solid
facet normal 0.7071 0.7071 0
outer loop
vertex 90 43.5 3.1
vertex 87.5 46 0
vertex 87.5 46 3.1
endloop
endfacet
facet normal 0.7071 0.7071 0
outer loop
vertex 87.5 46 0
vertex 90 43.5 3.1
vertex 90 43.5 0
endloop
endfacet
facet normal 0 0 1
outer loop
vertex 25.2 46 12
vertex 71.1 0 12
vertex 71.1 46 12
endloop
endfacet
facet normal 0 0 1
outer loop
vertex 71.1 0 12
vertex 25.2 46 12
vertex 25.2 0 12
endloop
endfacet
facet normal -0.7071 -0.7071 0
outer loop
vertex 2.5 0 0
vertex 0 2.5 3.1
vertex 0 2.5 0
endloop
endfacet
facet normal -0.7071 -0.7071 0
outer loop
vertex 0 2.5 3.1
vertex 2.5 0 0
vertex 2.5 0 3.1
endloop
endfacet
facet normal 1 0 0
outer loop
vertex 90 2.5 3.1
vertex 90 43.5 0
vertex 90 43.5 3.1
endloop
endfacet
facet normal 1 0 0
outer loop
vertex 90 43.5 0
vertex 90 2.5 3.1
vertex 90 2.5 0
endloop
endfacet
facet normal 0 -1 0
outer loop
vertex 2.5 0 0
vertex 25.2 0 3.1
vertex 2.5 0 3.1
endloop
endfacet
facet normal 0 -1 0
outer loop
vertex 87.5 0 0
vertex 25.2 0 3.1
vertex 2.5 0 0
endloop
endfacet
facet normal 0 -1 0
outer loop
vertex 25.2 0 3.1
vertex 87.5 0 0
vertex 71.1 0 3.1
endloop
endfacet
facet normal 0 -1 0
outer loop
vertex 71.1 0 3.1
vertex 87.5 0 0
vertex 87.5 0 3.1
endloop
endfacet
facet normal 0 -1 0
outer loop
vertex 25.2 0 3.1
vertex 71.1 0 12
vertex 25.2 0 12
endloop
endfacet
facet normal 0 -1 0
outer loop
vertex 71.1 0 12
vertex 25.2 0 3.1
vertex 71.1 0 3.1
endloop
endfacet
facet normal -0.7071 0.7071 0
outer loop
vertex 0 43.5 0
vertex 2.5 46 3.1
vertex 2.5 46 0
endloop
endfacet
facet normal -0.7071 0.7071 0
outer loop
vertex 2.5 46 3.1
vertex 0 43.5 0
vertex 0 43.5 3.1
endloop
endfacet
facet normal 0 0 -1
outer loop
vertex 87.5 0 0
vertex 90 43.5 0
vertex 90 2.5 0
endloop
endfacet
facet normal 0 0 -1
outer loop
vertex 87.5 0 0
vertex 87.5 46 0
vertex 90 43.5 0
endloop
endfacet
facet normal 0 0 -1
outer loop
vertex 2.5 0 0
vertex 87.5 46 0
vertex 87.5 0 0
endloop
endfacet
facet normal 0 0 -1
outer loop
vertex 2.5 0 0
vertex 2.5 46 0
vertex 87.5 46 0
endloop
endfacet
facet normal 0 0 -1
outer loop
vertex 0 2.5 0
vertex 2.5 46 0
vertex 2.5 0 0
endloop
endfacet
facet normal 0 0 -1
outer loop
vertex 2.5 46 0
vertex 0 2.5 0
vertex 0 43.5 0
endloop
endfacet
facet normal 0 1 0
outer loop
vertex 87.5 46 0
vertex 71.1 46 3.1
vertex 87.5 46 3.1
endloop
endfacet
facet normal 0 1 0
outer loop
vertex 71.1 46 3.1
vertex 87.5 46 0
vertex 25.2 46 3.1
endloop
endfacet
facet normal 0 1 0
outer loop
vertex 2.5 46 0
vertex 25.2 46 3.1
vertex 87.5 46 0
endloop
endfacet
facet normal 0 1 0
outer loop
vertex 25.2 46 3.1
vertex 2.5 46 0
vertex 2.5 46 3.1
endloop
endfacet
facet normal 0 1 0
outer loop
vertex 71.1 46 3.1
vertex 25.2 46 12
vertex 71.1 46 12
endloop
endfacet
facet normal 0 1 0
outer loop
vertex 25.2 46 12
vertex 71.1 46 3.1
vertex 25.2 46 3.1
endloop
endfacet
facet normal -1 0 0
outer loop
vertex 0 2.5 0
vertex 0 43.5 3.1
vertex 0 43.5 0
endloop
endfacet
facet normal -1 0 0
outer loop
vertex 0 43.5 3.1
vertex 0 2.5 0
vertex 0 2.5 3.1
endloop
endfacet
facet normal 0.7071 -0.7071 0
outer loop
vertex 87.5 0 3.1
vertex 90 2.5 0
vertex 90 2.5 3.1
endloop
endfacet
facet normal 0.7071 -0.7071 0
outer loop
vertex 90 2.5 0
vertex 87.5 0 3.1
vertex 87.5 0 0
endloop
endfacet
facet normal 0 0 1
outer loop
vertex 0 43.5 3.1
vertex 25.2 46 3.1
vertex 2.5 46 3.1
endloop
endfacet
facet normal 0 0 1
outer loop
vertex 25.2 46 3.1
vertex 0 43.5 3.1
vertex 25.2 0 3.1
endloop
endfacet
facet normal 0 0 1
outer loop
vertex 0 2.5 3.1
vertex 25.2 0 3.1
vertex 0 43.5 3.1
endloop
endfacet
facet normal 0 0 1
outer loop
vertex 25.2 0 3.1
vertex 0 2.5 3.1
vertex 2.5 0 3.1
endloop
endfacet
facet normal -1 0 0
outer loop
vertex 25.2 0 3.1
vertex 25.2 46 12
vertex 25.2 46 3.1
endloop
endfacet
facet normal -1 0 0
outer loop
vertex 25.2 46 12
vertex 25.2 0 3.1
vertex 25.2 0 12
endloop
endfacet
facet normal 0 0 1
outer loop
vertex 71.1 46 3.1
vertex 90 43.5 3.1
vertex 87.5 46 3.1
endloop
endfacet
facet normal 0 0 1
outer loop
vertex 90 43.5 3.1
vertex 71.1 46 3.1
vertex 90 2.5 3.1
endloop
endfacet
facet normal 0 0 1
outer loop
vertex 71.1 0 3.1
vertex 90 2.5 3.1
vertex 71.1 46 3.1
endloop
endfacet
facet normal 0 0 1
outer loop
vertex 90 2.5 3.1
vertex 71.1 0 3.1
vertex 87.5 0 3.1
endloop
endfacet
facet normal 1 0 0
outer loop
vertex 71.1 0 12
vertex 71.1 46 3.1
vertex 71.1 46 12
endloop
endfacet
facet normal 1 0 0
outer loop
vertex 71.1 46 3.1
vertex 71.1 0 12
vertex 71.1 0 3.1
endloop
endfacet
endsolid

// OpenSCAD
$fn = 32;

// ----------------------------------------------------------------------
// Stepped bar: centerstep, 90 x 46 x 12/3.1 mm
// ----------------------------------------------------------------------

// --- parameters (mm) ---
bar_l = 90;               // bar length, X
bar_w = 46;               // bar width, Y
plate_t = 12;             // thickness of the thick zone, Z
thin_t = 3.1;             // thickness of the thin zone
corner_c = 2.5;           // corner chamfer of the bar
step_cut = 8.9;           // material removed from the thin zone
thick_from = 25.2;        // start of the thick middle zone
thick_to = 71.1;          // end of the thick middle zone
depth_1 = 8.9;            // depth of cut 1 from the top face
depth_2 = 8.9;            // depth of cut 2 from the top face

profile = [[2.5, 0], [87.5, 0], [90, 2.5], [90, 43.5], [87.5, 46], [2.5, 46], [0, 43.5], [0, 2.5]];  // primary outline, 8 points, counter clockwise
void_1 = [[-1, -1], [25.2, -1], [25.2, 47], [-1, 47]];  // thin left end, 4 points
void_2 = [[71.1, -1], [91, -1], [91, 47], [71.1, 47]];  // thin right end, 4 points

// --- the one profile operation ---
difference() {
  linear_extrude(height = plate_t) polygon(points = profile);
  translate([0, 0, plate_t - depth_1])
    linear_extrude(height = depth_1 + 1) polygon(points = void_1);
  translate([0, 0, plate_t - depth_2])
    linear_extrude(height = depth_2 + 1) polygon(points = void_2);
}
